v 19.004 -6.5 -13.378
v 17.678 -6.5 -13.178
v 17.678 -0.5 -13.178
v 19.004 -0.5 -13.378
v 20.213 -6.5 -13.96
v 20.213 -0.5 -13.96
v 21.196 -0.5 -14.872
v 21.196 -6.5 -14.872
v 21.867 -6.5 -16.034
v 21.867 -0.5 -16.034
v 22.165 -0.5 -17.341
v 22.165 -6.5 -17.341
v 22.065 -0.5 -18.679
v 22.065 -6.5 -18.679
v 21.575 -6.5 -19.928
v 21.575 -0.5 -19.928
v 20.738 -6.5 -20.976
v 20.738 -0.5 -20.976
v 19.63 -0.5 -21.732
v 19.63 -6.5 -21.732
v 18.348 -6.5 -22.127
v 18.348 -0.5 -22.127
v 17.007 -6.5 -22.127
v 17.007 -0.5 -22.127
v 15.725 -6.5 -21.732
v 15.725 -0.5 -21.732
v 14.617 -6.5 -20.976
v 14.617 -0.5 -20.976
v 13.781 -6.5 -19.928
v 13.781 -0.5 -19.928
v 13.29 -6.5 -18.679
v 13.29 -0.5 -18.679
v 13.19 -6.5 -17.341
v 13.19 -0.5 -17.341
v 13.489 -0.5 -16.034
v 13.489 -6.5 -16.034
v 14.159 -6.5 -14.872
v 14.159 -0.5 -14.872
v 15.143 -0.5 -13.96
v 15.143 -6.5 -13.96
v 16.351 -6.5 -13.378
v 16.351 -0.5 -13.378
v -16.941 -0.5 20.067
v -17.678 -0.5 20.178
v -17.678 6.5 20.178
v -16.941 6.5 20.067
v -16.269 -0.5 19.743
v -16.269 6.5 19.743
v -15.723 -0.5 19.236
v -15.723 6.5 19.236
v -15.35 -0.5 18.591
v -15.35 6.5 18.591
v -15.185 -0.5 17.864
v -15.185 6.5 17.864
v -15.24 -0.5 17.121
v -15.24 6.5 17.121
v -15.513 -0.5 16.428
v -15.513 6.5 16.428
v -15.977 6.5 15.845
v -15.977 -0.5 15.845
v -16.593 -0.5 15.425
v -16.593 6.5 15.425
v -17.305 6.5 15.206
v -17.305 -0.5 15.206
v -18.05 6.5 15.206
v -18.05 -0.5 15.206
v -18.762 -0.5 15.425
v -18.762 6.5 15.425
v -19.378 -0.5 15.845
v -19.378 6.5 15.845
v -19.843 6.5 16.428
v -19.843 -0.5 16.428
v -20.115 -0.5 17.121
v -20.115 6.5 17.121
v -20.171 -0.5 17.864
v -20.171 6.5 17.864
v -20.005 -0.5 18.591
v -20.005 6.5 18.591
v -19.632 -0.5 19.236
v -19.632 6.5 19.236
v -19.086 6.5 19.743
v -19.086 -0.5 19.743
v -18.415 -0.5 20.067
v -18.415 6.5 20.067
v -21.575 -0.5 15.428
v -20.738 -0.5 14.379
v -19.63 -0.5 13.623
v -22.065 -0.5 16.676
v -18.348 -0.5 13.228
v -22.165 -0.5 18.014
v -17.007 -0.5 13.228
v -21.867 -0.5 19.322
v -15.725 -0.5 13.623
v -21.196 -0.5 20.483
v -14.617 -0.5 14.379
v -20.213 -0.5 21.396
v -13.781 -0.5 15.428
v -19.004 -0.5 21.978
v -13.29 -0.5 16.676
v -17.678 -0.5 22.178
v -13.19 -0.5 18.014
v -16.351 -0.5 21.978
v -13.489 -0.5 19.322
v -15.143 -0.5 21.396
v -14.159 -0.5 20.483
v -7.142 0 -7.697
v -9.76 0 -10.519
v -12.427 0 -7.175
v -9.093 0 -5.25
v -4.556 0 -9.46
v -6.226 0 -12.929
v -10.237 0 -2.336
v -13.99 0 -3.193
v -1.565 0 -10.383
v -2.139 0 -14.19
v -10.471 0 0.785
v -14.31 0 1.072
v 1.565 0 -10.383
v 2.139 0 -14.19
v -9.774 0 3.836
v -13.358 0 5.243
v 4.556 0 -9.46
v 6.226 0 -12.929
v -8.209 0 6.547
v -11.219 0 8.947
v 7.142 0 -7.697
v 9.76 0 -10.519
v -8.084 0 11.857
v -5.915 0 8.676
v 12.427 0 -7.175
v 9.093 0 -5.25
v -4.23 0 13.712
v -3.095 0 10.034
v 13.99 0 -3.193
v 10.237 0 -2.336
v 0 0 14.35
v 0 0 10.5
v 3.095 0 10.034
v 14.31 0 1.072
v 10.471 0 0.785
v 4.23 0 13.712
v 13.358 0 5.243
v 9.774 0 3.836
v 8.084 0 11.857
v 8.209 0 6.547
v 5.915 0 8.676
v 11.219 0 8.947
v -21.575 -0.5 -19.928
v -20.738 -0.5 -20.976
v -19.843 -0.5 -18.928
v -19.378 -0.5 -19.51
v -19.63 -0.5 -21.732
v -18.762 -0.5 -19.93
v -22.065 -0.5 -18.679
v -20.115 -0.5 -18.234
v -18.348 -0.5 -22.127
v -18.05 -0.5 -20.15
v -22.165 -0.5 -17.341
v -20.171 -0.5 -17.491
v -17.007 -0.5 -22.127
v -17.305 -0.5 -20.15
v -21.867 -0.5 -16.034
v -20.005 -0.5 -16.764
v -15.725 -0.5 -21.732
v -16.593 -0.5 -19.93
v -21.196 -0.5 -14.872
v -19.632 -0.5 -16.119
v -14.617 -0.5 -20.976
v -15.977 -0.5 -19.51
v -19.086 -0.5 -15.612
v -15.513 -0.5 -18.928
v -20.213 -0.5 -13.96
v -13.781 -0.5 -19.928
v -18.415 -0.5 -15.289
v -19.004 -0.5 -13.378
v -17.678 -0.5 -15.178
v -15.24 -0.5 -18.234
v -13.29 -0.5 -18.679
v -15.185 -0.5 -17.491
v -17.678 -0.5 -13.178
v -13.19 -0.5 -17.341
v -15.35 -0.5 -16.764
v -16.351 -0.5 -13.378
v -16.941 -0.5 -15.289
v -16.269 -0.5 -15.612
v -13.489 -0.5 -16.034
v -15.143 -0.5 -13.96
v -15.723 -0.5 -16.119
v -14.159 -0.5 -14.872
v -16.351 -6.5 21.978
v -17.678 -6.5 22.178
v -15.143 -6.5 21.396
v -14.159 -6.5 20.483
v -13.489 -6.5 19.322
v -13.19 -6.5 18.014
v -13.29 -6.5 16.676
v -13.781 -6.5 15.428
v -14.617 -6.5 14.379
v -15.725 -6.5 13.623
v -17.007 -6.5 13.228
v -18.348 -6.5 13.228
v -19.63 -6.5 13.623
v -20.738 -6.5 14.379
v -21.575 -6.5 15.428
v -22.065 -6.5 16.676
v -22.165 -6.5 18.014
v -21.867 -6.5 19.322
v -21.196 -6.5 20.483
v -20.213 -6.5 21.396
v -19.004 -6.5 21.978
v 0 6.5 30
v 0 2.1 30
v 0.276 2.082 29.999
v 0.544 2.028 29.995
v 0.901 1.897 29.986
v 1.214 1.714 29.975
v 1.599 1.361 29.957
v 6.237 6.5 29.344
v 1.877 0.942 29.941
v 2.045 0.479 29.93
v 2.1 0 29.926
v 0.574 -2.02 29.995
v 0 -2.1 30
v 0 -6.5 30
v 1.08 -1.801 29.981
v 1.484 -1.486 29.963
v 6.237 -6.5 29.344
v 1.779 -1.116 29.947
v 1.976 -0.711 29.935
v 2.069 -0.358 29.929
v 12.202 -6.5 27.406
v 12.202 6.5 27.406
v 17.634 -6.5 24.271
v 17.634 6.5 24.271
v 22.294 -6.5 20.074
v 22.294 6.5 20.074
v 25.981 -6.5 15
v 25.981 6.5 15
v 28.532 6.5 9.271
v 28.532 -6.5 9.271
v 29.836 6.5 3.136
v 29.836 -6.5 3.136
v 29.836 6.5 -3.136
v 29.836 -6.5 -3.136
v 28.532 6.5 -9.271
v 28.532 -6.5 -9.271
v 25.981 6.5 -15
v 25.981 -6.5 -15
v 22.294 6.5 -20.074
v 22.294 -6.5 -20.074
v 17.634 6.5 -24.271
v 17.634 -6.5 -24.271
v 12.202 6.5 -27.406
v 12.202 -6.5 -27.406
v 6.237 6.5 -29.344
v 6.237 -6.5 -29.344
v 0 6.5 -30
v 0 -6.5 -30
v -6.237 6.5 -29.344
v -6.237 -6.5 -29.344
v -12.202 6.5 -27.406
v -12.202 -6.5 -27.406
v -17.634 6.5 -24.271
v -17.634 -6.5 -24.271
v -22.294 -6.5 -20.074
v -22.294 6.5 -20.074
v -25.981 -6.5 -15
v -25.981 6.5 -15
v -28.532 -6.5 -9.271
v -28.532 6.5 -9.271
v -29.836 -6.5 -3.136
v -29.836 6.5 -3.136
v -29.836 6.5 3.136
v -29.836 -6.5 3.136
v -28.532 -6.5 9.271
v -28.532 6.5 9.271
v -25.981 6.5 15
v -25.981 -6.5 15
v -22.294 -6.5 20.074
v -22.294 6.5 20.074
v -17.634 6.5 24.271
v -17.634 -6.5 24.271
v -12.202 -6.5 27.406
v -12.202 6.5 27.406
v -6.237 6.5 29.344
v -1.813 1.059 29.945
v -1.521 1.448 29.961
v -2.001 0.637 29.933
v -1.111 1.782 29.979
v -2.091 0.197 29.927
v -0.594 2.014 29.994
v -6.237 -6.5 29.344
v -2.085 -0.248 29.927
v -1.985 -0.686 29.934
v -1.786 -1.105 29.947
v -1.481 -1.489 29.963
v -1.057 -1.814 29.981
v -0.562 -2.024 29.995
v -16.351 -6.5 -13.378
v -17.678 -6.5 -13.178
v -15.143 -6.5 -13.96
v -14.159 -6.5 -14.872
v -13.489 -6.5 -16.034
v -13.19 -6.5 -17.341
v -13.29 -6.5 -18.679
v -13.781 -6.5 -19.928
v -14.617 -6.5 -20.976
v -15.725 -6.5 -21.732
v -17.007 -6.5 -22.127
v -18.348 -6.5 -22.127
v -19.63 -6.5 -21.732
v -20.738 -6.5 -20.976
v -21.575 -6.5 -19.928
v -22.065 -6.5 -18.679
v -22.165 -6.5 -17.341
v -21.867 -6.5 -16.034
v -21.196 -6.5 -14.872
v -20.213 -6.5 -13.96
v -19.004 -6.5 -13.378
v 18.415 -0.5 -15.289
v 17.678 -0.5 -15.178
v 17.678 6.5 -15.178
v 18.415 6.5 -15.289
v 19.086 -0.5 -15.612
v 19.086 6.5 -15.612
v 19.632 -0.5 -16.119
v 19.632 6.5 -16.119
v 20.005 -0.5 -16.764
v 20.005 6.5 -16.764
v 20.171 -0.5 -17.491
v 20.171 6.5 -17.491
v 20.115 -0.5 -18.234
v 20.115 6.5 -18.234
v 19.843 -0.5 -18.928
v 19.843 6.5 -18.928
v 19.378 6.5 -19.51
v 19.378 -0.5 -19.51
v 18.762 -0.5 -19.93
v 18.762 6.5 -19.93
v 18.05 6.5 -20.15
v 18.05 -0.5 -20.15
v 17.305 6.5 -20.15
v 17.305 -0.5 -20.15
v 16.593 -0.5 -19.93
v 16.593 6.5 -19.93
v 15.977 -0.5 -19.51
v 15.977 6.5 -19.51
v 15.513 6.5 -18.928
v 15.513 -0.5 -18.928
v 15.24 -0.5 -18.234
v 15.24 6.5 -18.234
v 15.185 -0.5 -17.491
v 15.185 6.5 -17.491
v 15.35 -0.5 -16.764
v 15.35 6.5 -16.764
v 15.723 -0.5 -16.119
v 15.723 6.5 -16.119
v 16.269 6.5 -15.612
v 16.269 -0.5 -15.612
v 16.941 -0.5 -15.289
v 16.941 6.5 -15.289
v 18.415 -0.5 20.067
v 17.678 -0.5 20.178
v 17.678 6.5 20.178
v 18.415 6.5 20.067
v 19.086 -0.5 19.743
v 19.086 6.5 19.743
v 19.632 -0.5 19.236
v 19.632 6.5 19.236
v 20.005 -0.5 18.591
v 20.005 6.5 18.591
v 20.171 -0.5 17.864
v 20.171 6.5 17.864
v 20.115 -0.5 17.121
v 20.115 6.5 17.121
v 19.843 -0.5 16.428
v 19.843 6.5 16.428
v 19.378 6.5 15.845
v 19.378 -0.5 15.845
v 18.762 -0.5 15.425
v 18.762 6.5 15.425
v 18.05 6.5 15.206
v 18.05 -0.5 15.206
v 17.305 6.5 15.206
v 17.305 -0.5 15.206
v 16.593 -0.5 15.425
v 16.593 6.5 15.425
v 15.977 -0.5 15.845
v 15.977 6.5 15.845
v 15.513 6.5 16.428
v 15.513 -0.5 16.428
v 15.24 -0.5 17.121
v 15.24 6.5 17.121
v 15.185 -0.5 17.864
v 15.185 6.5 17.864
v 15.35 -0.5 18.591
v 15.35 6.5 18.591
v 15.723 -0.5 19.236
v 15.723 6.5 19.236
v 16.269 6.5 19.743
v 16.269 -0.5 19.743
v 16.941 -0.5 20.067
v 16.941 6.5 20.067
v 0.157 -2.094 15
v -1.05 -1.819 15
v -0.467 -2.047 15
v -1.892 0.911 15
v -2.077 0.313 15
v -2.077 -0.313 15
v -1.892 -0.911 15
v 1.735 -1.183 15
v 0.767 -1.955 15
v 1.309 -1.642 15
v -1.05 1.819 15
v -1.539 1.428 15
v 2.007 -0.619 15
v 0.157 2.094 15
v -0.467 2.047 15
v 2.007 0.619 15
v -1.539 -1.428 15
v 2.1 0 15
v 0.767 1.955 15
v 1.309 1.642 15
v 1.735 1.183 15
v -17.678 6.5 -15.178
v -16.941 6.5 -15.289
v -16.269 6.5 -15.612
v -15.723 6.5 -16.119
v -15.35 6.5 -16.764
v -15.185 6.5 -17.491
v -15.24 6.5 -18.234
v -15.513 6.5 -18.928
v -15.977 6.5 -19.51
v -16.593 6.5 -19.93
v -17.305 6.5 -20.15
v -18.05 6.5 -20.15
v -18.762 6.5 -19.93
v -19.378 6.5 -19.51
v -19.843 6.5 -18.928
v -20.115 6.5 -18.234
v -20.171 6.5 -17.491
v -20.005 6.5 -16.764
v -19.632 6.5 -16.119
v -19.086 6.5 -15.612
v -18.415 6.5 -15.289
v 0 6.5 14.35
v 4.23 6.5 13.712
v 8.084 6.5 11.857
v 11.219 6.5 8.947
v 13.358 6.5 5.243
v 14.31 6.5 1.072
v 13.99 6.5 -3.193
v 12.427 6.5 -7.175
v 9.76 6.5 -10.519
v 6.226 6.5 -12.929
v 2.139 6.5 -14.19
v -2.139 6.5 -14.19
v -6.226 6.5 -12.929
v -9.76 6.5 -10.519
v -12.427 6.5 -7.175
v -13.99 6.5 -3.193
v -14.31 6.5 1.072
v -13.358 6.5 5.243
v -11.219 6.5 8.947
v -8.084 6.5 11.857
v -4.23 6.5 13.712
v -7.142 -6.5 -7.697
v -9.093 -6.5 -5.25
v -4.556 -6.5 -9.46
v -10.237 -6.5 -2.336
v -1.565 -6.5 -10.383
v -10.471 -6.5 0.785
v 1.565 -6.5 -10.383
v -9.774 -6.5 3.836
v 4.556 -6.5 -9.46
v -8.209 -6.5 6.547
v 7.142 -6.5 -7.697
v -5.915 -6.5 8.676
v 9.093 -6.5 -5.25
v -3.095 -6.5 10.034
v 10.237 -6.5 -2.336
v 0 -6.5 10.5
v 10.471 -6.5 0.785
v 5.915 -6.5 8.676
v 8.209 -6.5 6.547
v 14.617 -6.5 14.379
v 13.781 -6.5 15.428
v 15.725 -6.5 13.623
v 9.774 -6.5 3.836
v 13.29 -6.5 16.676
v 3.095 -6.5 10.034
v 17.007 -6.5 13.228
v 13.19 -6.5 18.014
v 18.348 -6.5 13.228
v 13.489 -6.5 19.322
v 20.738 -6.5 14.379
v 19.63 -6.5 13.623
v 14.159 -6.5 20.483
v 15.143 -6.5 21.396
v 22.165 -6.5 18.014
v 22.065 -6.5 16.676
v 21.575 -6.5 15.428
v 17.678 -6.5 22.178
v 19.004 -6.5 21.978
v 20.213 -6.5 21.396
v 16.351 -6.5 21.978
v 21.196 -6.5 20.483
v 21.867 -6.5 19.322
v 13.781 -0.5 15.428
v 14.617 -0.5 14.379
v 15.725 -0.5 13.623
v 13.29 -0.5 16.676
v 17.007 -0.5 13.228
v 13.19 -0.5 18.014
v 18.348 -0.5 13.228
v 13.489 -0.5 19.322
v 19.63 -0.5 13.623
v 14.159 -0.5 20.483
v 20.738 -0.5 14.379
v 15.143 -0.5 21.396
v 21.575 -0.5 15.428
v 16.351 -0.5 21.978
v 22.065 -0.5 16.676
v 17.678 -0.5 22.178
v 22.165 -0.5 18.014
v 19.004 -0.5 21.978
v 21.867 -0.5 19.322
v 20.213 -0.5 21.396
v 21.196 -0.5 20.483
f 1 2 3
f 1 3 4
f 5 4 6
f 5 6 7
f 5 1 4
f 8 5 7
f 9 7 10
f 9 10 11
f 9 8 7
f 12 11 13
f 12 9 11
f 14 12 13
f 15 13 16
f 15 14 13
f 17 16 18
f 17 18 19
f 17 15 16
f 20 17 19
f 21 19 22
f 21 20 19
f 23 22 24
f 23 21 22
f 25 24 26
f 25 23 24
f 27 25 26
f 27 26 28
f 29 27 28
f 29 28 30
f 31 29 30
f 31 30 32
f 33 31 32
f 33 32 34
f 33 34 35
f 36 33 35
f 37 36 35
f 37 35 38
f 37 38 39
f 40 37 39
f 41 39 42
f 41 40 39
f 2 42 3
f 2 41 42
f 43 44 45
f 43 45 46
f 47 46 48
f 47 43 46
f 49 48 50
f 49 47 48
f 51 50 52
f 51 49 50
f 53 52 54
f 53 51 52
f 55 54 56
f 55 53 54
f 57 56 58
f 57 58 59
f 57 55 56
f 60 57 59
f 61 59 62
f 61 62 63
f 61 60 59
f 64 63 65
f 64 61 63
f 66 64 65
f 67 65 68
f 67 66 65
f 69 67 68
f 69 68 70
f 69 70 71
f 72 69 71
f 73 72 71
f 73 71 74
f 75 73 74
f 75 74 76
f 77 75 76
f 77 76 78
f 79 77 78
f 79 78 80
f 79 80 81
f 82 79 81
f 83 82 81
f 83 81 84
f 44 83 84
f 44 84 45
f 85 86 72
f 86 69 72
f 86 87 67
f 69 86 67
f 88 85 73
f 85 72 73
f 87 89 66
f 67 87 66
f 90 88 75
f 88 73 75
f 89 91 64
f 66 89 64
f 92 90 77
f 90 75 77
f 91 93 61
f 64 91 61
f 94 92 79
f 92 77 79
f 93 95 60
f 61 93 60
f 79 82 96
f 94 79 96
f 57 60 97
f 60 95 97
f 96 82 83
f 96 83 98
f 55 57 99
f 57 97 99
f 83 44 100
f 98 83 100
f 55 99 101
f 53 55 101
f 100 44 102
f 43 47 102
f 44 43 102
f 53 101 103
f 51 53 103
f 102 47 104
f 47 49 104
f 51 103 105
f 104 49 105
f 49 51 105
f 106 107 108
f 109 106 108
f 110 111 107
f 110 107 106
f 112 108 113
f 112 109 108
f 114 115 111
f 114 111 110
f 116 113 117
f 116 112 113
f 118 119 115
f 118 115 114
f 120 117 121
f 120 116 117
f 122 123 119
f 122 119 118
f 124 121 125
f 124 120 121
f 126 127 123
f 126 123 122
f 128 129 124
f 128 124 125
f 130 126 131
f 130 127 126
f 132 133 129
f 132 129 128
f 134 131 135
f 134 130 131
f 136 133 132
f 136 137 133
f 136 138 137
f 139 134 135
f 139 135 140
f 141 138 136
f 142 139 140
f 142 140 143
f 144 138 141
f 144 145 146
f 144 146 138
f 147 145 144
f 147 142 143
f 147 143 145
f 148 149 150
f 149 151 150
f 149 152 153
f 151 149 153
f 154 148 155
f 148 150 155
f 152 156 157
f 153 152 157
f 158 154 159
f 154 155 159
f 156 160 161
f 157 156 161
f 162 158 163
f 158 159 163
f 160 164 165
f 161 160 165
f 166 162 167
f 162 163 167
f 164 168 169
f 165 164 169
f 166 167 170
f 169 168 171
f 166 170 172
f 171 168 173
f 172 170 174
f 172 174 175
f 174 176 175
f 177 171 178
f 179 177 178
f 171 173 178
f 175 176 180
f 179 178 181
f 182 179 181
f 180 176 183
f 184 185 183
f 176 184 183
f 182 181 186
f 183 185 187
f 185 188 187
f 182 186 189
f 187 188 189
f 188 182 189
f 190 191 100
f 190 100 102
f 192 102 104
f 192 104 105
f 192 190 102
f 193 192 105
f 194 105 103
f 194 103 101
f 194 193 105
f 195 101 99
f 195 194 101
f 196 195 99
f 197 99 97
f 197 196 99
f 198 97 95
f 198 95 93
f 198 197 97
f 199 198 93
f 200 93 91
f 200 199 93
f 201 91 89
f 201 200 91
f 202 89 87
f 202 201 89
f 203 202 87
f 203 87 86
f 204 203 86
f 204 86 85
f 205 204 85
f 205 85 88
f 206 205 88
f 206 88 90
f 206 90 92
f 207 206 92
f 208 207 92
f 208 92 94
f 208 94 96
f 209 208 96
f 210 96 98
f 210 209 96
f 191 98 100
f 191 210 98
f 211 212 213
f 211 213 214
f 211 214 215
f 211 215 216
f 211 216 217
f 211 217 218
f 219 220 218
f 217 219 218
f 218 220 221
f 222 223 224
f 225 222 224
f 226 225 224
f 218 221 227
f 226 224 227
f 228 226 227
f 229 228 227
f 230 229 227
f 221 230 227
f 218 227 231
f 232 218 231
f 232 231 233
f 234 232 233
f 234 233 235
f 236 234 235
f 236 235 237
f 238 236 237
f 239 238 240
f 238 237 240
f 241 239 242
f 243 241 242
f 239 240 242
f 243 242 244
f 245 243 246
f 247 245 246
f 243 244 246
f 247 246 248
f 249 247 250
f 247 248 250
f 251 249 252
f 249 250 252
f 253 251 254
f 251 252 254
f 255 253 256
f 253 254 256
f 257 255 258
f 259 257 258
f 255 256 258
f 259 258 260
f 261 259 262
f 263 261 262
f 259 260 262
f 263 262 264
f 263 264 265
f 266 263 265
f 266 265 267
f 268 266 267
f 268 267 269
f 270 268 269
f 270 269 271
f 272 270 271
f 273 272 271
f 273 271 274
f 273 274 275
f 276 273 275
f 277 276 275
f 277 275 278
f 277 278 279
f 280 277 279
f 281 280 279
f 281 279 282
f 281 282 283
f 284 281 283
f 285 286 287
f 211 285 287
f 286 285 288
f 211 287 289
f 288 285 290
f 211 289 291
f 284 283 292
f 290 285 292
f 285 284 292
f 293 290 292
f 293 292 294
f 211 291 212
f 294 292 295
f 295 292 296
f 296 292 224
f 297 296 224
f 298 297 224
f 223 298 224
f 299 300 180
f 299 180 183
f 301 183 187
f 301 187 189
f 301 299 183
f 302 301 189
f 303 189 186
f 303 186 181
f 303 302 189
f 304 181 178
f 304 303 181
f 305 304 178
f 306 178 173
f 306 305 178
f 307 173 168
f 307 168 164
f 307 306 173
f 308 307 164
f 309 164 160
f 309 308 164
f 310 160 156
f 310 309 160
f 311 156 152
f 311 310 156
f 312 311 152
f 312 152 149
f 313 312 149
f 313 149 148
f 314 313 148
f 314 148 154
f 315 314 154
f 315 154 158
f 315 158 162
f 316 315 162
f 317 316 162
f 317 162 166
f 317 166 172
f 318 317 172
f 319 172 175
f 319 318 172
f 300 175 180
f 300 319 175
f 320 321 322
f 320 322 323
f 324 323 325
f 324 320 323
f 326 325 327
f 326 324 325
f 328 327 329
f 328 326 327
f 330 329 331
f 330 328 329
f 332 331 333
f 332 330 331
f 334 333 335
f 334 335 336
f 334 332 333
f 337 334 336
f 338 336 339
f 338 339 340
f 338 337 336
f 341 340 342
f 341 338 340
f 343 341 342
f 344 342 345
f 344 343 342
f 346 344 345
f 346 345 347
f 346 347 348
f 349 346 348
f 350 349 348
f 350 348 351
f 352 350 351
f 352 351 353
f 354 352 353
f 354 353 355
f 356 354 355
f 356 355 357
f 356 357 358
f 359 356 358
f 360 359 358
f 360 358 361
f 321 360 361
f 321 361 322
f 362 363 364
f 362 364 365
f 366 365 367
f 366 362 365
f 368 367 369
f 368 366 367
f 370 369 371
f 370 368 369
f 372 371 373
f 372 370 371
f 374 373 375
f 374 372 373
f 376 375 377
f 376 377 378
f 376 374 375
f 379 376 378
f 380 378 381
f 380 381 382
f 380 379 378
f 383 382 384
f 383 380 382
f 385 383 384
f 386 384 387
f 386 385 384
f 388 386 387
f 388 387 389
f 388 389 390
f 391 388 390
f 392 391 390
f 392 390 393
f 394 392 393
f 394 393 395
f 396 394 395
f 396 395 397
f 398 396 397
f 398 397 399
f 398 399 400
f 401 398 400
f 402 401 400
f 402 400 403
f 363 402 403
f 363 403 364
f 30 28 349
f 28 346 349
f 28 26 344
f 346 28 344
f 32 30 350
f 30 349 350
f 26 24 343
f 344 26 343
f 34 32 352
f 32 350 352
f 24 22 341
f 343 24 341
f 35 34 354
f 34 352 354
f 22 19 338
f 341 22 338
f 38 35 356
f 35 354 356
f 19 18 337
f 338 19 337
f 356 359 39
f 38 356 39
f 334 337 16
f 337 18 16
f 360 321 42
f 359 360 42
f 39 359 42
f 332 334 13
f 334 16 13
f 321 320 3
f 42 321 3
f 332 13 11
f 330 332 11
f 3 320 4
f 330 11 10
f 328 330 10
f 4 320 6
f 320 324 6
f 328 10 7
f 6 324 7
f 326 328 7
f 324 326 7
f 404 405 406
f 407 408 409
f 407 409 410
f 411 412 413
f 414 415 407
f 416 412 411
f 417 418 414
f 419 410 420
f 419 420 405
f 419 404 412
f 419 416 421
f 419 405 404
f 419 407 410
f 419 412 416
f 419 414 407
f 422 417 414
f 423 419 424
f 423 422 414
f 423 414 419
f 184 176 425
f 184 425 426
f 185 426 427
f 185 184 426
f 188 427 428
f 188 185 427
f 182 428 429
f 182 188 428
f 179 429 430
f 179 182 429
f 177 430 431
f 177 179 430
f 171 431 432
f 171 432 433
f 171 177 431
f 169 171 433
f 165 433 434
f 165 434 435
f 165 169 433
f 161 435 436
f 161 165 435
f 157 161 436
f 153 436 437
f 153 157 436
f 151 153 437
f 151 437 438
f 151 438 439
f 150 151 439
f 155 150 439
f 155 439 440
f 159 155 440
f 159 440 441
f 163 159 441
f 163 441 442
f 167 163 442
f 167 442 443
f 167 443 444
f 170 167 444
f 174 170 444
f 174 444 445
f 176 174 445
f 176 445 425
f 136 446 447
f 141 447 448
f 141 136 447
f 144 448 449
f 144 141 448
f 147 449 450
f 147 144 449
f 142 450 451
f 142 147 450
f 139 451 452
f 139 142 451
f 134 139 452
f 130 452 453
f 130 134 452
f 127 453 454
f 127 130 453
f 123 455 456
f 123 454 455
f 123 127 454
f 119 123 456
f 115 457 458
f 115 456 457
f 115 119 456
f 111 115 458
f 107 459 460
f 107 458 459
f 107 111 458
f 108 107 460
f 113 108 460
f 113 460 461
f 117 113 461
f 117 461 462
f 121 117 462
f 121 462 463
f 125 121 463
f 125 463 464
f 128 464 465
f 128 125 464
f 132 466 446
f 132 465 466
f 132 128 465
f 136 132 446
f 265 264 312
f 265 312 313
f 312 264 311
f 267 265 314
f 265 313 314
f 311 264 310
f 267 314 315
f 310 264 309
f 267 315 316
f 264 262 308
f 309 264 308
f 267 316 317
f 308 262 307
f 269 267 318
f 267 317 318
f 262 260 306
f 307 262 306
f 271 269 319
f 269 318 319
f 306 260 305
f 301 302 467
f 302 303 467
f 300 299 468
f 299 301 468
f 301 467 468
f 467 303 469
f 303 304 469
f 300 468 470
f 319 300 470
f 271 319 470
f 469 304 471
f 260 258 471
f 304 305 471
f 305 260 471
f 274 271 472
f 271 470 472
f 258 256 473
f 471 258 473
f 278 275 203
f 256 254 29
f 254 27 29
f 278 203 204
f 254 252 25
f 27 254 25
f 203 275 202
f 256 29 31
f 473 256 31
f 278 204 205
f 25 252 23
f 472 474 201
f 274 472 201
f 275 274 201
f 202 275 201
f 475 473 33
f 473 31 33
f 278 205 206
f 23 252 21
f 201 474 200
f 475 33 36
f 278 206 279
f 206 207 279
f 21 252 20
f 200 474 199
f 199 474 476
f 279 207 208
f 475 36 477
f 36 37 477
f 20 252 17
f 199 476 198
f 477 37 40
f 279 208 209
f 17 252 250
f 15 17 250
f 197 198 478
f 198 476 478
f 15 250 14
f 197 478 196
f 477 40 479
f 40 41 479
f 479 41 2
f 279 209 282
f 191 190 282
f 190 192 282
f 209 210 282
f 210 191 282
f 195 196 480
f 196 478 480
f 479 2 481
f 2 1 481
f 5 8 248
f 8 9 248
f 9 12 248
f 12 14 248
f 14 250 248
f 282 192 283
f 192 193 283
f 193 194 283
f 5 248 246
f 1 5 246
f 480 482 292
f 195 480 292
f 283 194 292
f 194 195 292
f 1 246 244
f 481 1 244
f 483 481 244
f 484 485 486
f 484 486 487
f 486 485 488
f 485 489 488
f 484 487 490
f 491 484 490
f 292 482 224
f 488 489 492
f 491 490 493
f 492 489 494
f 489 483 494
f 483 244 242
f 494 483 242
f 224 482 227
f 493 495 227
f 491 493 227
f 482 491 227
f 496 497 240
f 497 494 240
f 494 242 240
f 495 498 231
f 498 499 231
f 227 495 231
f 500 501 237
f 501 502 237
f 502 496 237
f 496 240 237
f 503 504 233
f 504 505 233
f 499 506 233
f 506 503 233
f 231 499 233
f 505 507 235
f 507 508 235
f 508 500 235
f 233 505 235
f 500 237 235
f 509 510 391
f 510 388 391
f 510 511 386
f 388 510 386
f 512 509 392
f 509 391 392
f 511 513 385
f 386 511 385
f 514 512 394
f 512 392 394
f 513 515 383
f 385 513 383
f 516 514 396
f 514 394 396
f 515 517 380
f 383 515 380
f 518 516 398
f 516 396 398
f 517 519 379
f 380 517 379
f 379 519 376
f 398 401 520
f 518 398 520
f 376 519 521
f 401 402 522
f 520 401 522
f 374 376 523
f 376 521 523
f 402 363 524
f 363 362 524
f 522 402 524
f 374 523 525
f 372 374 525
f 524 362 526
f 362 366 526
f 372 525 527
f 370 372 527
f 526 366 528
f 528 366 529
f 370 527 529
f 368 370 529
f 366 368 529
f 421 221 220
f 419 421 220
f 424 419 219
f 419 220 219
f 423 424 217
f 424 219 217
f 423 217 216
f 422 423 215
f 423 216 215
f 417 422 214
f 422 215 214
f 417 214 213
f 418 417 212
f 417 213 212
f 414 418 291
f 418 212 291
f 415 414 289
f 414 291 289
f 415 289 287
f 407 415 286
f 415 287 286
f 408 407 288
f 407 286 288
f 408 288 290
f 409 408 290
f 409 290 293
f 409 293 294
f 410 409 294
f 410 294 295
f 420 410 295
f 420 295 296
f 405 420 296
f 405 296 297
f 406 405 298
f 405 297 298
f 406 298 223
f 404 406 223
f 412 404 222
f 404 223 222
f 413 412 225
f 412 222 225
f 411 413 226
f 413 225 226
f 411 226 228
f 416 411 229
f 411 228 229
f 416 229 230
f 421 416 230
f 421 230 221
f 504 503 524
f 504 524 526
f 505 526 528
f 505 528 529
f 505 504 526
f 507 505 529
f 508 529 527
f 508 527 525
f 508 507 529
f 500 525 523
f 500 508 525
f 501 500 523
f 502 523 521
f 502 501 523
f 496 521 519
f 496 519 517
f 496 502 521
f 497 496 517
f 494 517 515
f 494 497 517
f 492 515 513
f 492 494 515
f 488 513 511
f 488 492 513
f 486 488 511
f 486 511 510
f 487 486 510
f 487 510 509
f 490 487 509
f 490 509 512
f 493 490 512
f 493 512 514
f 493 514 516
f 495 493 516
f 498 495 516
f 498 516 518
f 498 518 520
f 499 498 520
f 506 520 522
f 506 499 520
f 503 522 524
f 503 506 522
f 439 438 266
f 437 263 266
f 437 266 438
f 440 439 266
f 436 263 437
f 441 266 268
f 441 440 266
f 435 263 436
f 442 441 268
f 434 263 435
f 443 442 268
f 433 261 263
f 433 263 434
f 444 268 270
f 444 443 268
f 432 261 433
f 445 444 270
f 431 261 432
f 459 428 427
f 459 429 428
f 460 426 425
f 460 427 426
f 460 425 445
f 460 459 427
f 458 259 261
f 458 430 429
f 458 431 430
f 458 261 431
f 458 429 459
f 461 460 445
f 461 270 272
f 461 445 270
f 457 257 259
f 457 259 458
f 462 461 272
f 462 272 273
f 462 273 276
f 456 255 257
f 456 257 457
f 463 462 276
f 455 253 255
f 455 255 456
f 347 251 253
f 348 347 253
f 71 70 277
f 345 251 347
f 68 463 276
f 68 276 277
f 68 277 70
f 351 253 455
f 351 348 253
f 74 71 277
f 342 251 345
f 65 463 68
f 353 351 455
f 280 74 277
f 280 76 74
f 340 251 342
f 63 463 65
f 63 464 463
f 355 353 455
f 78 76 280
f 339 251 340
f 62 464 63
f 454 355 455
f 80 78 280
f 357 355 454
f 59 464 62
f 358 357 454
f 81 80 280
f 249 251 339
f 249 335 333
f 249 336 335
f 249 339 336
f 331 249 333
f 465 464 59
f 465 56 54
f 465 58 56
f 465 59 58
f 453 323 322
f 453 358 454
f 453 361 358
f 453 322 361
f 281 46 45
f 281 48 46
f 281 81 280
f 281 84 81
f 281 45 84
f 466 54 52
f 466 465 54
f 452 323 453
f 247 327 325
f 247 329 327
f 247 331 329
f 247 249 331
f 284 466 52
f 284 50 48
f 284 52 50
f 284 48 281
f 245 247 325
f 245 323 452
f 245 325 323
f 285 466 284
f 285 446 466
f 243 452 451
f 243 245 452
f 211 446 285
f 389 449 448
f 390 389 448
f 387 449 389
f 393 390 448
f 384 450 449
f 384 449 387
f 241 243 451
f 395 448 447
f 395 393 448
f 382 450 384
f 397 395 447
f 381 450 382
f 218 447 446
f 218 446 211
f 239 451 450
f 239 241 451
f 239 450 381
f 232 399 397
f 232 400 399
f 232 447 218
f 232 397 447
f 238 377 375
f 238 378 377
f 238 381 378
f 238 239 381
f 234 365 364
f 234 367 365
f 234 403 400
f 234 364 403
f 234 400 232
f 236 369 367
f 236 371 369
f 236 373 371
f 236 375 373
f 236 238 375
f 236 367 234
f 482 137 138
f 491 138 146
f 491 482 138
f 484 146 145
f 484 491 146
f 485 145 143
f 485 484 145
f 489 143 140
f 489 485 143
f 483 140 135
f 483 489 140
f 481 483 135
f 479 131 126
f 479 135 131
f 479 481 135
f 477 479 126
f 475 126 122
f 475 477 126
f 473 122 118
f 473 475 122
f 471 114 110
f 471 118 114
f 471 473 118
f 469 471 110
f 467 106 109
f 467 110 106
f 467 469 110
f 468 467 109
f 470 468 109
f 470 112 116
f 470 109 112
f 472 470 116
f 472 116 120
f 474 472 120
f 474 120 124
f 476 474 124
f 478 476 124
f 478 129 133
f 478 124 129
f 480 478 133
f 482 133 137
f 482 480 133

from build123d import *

# Parameters (mm, degrees)
BOSS_EXTRUDE1_DEPTH      = 6.5
BOSS_EXTRUDE1_DEPTH_BACK = 6.5
SKETCH1_R                = 30
SKETCH1_R_2              = 10.5
SKETCH1_R_3              = 2.5
SKETCH2_R                = 14.35
CUT_EXTRUDE1_DEPTH       = 7.9375
CUT_EXTRUDE3_START       = -6.5
SKETCH3_R                = 4.5
CUT_EXTRUDE3_DEPTH       = 6
CUT_EXTRUDE4_START       = 30
SKETCH4_R                = 2.1
CUT_EXTRUDE4_DEPTH       = 15


with BuildPart() as part:
    # Sketch1 → Boss-Extrude1 (new, two sides: drawn at the far end of the back side and taken through both)
    with BuildSketch(Plane(origin=(0, 0, 0), x_dir=(1, 0, 0), z_dir=(0, 1, 0)).offset(-BOSS_EXTRUDE1_DEPTH_BACK)):
        with Locations(Location((0, 0, 0), (0, 0, 270))):
            Circle(SKETCH1_R)
        with Locations(Location((0, 0, 0), (0, 0, 270))):
            Circle(SKETCH1_R_2, mode=Mode.SUBTRACT)
        with Locations(Location((17.67766953, 17.67766953, 0), (0, 0, 270))):
            Circle(SKETCH1_R_3, mode=Mode.SUBTRACT)
        with Locations(Location((17.67766953, -17.67766953, 0), (0, 0, 270))):
            Circle(SKETCH1_R_3, mode=Mode.SUBTRACT)
        with Locations(Location((-17.67766953, -17.67766953, 0), (0, 0, 270))):
            Circle(SKETCH1_R_3, mode=Mode.SUBTRACT)
        with Locations(Location((-17.67766953, 17.67766953, 0), (0, 0, 270))):
            Circle(SKETCH1_R_3, mode=Mode.SUBTRACT)
    extrude(amount=BOSS_EXTRUDE1_DEPTH + BOSS_EXTRUDE1_DEPTH_BACK)

    # Sketch2 → Cut-Extrude1 (cut)
    with BuildSketch(Plane(origin=(0, 0, 0), x_dir=(1, 0, 0), z_dir=(0, 1, 0))):
        with Locations(Location((0, 0, 0), (0, 0, 270))):
            Circle(SKETCH2_R)
    extrude(amount=CUT_EXTRUDE1_DEPTH, mode=Mode.SUBTRACT)

    # Sketch3 → Cut-Extrude3 (cut)
    with BuildSketch(Plane(origin=(0, 0, 0), x_dir=(1, 0, 0), z_dir=(0, 1, 0)).offset(CUT_EXTRUDE3_START)):
        with Locations(Location((17.67766953, 17.67766953, 0), (0, 0, 270))):
            Circle(SKETCH3_R)
        with Locations(Location((17.67766953, -17.67766953, 0), (0, 0, 270))):
            Circle(SKETCH3_R)
        with Locations(Location((-17.67766953, -17.67766953, 0), (0, 0, 270))):
            Circle(SKETCH3_R)
        with Locations(Location((-17.67766953, 17.67766953, 0), (0, 0, 270))):
            Circle(SKETCH3_R)
    extrude(amount=CUT_EXTRUDE3_DEPTH, mode=Mode.SUBTRACT)

    # Sketch4 → Cut-Extrude4 (cut)
    with BuildSketch(Plane.XY.offset(CUT_EXTRUDE4_START)):
        Circle(SKETCH4_R)
    extrude(amount=-CUT_EXTRUDE4_DEPTH, mode=Mode.SUBTRACT)


solid = part.part
